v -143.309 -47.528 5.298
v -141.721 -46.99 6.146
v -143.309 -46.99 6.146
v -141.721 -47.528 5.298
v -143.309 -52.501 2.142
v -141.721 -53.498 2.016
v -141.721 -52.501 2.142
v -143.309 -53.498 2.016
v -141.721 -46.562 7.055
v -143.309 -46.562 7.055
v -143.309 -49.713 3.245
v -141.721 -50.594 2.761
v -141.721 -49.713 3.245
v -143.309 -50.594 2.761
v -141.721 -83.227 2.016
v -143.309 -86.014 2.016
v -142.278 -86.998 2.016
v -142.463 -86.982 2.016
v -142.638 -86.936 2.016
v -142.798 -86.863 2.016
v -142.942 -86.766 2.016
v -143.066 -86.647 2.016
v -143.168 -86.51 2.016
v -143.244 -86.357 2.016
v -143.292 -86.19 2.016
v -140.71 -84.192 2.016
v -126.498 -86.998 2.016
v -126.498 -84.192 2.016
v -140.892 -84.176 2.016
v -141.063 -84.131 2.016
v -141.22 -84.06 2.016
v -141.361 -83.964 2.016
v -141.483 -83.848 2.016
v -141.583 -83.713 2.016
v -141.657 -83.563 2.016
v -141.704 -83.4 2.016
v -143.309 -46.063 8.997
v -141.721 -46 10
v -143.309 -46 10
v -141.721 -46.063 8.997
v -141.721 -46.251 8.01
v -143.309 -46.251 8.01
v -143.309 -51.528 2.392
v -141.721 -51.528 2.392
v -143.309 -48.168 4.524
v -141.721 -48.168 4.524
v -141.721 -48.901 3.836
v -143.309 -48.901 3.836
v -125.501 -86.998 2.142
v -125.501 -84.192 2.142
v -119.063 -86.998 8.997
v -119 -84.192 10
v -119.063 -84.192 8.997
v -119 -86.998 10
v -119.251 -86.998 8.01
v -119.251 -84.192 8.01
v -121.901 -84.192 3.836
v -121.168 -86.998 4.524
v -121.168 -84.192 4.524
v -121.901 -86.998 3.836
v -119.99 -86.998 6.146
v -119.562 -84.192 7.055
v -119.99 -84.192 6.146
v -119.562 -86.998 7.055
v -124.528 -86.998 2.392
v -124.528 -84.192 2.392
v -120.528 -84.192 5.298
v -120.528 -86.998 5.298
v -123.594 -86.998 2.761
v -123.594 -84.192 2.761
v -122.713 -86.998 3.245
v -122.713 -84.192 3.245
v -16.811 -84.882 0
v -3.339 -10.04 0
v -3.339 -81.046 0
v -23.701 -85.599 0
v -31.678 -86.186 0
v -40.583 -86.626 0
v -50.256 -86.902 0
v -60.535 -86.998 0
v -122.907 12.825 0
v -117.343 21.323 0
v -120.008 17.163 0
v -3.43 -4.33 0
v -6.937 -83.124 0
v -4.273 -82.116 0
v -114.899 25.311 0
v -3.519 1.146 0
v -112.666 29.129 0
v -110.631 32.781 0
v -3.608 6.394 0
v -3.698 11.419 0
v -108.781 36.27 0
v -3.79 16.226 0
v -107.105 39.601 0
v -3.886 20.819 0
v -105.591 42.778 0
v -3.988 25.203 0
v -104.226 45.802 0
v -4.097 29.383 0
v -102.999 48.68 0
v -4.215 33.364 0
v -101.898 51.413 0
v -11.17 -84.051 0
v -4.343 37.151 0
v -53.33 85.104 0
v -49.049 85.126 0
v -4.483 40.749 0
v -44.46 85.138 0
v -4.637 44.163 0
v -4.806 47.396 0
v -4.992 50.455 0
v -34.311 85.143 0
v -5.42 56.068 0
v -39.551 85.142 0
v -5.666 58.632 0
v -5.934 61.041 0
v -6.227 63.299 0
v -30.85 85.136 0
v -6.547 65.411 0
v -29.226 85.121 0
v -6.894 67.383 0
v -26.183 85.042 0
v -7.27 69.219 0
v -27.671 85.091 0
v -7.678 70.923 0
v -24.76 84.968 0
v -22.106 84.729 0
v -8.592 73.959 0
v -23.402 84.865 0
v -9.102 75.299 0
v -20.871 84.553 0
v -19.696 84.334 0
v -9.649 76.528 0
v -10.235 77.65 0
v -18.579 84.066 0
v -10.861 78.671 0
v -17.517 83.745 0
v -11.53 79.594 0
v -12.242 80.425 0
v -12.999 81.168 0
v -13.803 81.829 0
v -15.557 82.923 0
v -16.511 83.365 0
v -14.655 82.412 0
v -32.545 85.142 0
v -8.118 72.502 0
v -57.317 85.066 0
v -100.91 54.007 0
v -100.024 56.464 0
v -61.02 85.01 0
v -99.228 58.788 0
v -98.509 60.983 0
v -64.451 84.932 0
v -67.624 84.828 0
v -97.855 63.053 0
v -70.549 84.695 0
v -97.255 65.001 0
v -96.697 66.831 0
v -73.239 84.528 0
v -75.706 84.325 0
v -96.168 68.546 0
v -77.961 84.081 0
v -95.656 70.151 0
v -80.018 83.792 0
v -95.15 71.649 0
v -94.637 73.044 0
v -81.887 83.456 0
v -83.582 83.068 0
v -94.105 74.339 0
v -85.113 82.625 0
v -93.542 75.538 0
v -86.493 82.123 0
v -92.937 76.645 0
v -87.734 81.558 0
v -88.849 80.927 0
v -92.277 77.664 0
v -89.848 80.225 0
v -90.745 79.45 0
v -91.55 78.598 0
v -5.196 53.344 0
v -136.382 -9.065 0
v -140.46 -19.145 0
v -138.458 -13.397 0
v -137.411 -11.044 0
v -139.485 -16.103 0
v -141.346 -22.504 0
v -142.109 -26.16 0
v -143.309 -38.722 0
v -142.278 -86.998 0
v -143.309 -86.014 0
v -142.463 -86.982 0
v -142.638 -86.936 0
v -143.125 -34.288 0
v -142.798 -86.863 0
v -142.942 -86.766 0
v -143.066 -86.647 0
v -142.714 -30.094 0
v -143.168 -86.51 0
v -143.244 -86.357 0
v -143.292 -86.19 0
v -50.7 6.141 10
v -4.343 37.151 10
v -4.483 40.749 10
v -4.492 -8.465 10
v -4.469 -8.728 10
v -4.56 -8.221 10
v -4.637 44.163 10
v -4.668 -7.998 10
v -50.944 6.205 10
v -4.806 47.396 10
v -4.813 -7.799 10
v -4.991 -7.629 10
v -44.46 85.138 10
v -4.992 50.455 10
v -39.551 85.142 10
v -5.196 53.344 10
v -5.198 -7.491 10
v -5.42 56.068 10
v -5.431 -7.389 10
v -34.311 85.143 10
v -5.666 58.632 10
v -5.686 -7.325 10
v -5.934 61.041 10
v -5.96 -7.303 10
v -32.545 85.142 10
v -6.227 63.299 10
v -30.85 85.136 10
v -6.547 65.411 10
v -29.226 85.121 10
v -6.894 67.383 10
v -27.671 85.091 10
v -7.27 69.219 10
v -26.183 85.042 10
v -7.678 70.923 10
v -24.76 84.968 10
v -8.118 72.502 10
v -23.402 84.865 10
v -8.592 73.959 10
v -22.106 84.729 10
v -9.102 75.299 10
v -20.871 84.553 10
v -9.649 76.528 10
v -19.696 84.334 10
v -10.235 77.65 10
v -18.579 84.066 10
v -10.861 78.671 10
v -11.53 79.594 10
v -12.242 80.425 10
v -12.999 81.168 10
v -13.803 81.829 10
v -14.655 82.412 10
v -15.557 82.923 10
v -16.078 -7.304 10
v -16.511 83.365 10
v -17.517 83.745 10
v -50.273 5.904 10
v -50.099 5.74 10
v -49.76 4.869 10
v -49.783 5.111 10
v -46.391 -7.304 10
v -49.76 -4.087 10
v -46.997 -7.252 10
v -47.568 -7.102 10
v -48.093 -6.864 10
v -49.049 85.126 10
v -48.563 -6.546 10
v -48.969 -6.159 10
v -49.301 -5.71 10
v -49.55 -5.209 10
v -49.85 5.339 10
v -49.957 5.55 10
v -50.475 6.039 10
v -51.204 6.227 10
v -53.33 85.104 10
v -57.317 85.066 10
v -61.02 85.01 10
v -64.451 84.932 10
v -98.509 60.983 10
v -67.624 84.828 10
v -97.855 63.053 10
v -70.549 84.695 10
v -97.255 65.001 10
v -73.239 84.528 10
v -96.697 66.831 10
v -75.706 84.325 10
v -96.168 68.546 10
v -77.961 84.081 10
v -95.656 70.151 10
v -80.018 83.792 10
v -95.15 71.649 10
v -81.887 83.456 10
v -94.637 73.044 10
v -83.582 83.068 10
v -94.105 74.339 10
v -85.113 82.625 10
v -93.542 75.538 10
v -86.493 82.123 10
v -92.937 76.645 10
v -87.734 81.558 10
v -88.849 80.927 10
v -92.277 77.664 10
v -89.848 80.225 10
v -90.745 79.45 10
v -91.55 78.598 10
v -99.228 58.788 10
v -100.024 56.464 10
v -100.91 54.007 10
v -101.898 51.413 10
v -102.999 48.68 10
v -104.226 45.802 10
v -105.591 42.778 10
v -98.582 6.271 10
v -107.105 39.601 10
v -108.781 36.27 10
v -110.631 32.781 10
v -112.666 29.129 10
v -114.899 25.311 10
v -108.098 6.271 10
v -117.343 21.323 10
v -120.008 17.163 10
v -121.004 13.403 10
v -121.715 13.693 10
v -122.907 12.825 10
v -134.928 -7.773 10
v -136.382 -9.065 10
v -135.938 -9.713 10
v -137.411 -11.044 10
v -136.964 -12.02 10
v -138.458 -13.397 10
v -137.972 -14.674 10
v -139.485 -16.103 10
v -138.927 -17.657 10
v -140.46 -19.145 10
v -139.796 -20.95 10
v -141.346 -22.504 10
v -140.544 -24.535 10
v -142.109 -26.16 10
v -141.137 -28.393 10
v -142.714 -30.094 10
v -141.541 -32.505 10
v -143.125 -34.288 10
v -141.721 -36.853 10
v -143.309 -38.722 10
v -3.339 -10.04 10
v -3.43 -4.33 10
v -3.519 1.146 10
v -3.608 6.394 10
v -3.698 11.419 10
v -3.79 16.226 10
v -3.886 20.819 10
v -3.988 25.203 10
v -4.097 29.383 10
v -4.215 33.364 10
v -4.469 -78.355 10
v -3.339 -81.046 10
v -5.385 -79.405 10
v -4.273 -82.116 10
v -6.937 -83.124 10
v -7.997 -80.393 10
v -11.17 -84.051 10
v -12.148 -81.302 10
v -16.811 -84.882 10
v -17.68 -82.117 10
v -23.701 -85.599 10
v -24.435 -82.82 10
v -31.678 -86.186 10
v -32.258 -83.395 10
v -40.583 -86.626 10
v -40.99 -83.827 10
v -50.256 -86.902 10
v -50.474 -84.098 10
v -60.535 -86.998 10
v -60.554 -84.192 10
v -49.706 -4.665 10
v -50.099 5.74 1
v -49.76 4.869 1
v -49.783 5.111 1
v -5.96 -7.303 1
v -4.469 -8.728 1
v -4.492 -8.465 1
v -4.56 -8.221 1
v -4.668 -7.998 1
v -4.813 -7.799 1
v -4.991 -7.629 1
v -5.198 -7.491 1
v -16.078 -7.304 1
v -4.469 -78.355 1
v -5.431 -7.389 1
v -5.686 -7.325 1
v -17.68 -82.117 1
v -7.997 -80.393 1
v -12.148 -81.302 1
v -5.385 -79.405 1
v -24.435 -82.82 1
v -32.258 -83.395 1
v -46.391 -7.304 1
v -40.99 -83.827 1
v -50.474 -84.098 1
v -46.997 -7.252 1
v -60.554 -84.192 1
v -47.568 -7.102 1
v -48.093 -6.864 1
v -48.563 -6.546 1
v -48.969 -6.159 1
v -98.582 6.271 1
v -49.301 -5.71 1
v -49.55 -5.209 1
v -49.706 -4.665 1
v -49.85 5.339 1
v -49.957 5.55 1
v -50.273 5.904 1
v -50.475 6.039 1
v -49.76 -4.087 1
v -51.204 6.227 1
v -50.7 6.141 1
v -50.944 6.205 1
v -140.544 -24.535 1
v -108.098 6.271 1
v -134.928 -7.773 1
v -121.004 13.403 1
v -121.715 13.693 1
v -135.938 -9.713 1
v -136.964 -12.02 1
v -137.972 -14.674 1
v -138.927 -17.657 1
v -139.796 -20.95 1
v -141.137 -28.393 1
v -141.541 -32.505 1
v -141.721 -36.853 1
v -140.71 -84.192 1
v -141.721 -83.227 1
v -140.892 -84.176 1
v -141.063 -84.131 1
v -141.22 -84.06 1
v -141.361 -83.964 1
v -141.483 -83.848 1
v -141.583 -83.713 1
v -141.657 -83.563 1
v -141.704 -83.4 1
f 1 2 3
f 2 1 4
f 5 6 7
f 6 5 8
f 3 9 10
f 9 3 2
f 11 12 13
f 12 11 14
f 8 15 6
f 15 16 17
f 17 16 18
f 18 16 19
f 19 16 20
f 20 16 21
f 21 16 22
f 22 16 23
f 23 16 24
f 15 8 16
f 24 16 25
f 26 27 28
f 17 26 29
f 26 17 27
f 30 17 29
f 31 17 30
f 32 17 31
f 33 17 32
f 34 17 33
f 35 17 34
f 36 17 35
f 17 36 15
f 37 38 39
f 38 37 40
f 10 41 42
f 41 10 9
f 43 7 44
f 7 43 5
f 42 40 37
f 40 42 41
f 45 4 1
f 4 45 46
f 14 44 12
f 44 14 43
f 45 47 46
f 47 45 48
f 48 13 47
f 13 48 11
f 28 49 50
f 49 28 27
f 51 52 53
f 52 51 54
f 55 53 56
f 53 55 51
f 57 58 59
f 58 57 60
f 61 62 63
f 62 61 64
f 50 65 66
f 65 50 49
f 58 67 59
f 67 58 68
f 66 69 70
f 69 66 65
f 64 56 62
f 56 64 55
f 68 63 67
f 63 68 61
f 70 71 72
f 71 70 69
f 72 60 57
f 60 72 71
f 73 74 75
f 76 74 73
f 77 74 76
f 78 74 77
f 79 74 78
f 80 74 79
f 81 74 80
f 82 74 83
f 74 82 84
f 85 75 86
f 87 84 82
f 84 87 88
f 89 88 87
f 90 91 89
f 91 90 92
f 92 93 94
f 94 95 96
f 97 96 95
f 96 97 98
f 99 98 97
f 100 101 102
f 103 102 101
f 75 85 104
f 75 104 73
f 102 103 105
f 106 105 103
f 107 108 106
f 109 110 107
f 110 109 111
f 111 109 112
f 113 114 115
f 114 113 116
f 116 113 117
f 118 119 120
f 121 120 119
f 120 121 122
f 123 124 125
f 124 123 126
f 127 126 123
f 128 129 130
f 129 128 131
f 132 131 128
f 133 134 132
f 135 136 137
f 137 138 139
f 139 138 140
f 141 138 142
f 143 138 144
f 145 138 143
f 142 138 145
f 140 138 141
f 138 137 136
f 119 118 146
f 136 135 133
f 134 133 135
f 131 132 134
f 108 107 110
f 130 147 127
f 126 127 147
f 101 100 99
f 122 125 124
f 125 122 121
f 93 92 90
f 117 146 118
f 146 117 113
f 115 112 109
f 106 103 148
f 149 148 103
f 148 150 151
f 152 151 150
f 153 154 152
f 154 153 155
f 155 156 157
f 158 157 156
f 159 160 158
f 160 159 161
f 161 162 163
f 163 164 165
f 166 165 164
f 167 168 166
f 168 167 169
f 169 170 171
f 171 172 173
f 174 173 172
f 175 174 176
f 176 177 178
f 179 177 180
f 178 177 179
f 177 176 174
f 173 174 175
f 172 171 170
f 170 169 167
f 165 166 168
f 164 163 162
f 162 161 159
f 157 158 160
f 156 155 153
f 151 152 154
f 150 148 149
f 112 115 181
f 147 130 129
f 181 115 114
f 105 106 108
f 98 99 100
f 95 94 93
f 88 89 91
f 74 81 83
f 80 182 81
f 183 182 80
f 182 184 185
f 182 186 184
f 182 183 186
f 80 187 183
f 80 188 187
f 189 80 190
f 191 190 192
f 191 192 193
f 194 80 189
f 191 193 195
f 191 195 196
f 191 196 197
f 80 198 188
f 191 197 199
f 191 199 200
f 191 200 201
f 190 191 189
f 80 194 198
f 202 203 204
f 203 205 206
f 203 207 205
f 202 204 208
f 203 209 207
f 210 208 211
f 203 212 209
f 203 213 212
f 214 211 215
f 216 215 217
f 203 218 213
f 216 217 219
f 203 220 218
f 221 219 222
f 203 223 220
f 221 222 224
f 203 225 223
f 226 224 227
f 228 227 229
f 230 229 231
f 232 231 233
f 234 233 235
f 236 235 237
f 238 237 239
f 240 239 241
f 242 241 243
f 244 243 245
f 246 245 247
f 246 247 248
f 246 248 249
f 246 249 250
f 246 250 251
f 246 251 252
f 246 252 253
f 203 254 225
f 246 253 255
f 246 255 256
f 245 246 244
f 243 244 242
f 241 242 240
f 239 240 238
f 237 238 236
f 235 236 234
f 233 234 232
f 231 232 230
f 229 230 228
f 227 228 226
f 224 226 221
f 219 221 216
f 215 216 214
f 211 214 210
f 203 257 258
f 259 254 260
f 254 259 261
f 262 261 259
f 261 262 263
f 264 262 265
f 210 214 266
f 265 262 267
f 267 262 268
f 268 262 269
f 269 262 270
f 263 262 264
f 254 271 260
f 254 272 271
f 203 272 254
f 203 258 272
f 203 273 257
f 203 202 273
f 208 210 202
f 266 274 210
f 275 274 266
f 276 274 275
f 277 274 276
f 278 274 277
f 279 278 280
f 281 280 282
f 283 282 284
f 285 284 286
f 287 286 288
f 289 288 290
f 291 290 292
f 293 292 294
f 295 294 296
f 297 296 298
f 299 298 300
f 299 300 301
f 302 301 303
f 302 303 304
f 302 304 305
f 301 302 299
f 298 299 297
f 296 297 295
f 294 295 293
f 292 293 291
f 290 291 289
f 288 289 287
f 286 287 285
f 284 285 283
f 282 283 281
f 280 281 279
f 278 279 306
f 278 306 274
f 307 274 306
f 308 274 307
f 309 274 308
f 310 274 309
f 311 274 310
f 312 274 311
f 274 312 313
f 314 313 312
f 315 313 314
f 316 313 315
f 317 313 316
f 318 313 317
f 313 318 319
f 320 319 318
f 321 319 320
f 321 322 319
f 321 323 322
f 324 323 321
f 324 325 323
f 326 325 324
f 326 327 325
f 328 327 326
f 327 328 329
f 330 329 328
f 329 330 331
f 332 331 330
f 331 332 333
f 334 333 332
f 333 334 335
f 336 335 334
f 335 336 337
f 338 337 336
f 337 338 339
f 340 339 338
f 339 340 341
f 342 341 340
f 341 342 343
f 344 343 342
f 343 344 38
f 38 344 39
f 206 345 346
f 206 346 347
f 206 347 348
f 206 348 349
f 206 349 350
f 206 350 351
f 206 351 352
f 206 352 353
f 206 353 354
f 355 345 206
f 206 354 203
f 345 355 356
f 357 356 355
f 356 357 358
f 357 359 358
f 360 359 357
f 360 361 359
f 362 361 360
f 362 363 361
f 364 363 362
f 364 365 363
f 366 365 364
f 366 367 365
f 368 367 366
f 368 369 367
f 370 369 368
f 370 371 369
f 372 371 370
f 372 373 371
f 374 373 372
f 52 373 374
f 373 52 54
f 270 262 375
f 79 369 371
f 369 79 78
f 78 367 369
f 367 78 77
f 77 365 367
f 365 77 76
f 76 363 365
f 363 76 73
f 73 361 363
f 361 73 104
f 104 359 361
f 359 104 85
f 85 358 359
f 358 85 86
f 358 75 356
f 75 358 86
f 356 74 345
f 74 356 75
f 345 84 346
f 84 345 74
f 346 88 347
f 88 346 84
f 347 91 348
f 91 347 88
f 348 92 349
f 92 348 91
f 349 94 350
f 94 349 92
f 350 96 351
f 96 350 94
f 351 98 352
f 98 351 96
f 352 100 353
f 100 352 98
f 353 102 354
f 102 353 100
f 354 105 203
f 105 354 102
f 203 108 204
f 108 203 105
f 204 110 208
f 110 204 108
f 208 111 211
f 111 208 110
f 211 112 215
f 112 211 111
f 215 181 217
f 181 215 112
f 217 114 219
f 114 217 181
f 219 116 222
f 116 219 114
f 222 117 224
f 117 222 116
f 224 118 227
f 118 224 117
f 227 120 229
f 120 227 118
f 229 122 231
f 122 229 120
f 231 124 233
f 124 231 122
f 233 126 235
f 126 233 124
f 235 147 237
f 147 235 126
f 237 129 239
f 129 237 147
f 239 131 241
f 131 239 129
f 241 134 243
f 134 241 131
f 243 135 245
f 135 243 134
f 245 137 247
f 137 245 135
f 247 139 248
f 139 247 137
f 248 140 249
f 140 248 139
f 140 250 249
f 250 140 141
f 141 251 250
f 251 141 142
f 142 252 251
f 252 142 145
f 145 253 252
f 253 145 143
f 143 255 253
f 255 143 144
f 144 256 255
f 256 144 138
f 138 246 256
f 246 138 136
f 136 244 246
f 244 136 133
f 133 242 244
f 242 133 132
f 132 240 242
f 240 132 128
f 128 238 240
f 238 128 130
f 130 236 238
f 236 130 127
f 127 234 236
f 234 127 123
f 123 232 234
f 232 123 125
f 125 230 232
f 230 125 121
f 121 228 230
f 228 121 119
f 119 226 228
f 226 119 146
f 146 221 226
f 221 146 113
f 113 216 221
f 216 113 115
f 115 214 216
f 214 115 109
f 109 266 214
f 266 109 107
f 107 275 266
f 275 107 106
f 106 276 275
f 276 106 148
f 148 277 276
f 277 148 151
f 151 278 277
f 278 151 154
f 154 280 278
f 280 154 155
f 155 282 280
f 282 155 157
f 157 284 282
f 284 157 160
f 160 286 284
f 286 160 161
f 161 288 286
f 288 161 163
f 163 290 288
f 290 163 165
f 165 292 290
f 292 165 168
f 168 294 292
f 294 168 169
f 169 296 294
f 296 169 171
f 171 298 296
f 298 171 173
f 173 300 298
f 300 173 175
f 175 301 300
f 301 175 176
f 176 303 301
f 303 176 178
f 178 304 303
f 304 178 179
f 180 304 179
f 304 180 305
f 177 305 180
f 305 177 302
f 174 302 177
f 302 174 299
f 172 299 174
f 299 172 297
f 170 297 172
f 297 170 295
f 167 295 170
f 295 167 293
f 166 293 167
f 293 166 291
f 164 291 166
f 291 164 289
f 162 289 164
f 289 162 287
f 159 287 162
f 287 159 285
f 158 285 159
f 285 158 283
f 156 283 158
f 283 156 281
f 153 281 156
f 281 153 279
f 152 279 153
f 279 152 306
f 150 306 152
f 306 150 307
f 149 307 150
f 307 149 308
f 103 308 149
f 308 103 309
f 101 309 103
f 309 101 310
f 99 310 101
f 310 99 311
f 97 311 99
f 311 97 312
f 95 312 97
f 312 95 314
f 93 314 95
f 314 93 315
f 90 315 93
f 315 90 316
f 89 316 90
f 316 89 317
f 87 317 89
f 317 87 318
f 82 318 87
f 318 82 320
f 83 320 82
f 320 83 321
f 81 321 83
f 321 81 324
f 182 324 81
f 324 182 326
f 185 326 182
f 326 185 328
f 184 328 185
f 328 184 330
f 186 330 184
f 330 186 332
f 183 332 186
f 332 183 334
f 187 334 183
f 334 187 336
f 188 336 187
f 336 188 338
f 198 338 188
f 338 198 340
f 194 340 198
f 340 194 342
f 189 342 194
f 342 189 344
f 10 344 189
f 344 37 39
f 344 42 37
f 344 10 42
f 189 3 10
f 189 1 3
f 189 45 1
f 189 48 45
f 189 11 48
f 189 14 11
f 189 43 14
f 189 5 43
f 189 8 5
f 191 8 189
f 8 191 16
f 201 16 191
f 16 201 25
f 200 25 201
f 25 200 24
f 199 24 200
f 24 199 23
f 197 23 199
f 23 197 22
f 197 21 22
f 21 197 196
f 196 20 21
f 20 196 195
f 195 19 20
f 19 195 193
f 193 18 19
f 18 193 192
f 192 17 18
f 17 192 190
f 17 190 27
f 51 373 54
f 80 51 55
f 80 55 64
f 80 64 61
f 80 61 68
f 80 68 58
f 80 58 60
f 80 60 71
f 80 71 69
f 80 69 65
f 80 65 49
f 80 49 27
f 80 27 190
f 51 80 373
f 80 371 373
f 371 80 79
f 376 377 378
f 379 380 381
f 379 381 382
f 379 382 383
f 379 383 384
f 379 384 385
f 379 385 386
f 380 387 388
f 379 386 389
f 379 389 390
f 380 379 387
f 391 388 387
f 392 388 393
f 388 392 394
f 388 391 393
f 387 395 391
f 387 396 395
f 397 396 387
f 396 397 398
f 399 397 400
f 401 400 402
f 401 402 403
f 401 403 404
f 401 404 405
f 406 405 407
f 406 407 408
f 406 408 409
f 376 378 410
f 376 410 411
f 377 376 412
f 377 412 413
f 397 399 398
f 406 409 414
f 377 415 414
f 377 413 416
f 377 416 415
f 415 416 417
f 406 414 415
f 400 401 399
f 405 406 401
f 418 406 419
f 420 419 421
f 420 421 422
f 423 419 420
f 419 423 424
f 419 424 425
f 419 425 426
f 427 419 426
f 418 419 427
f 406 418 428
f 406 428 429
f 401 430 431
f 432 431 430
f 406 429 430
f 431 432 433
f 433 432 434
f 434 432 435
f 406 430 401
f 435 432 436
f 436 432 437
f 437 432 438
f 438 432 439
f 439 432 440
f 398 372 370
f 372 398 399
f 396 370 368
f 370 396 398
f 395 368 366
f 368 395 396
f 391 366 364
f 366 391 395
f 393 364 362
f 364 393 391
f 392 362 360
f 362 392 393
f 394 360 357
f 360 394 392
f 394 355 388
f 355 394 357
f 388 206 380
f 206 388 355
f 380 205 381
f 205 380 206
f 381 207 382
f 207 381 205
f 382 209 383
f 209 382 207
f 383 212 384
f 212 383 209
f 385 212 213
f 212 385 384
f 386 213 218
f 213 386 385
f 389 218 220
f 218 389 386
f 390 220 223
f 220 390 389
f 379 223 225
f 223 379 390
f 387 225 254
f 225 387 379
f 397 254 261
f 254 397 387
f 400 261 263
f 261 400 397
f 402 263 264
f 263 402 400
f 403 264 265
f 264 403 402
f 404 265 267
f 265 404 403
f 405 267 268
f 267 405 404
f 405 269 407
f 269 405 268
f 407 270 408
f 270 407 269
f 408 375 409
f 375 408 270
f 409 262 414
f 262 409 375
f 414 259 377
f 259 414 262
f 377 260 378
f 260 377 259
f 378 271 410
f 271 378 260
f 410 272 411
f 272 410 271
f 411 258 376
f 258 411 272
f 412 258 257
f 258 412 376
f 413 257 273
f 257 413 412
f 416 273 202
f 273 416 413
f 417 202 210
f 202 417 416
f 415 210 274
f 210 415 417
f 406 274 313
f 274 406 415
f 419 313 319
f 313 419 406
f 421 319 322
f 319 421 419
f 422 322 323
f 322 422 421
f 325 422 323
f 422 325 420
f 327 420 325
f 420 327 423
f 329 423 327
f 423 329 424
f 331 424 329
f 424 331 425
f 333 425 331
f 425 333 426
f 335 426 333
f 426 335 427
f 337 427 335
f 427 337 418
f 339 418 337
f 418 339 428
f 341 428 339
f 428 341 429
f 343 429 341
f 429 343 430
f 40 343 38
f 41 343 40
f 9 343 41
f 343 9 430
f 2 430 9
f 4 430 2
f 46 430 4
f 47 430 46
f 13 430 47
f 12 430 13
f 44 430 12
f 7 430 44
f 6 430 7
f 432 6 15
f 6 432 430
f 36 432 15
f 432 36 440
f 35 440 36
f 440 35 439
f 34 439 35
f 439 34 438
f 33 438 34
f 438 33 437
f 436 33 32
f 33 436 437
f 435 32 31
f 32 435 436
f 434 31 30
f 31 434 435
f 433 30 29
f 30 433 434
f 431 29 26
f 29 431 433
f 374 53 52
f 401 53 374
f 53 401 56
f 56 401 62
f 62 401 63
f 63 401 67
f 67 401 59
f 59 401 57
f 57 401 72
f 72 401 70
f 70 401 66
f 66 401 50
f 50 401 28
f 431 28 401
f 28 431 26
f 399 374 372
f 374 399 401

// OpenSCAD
// file: ../bezier.scad
function mix(p1, p2, t) = [p1[0] * (1 - t) + p2[0] * t, p1[1] * (1 - t) + p2[1] * t];

function bezier_point(p, t) =
    let (
        a = mix(p[0], p[1], t),
        b = mix(p[1], p[2], t),
        c = mix(p[2], p[3], t),
        d = mix(a, b, t),
        e = mix(b, c, t)
    )
    mix(d, e, t);

function bezier_points(p, N) = [
    for (i = [0 : N - 1]) bezier_point(p, i / (N - 1))
];
// file: ../profiles.scad
include <array_ops.scad>
include <bezier.scad>

n_corner_points = 10;

board_profile_points = concat(
    [[-119.504642, 22.529083], [-106.09824, 14.768994],
        [-106.09824, 14.768994], [-96.213288, 14.768994],
        [-96.213288, 14.768994], [-46.99839, 14.721548]],
bezier_points(
    [[-46.99839, 14.721548], [-46.16894, 14.721172], [-45.497997, 14.049582], [-
45.498384, 13.243936]], n_corner_points),
    [[-45.498384, 13.243936], [-45.498384, 3.499618]],
bezier_points(
    [[-45.498384, 3.499618], [-45.499493, 1.567921], [-43.9343, 0.00093], [-41.998735, -
0.000898]],
n_corner_points),
    [[-41.998735, -0.000898], [-10.510735, -0.000898],
        [-10.510735, -0.000898], [0, 0]],
bezier_points(
    [[0, 0], [0.876629, 0.003368], [1.548207, -0.667575], [1.548595, -1.550011]],
n_corner_points),
    [[1.548595, -1.550011], [1.548595, -77.305898]],
bezier_points(
    [[1.548595, -77.305898], [1.498595, -80.815755], [-24.536412, -83.655898], [-
56.710735, -83.655898]], n_corner_points),
    [[-56.710735, -83.655898], [-114.910735, -83.655898],
        [-114.910735, -83.655898], [-139.974397, -83.655898]],
bezier_points(
    [[-139.974397, -83.655898], [-140.553969, -83.655567], [-141.023536, -83.185462], [-
141.023875, -82.60589]], n_corner_points),
    [[-141.023875, -82.60589], [-141.023875, -32.15045]],
bezier_points(
    [[-141.023875, -32.15045], [-140.847733, -17.594028], [-137.053996, -6.226473], [-
133.968073, -0.510408]], n_corner_points),
    [[-133.968073, -0.510408], [-120.242566, 22.844102]]
);

wrist_support_top_points = concat(
    [[-119.504642, 22.529083], [-106.09824, 14.768994],
        [-106.09824, 14.768994], [-96.213288, 14.768994],
        [-96.213288, 14.768994], [-46.99839, 14.721548]],
bezier_points(
    [[-46.99839, 14.721548], [-46.16894, 14.721172], [-45.497997, 14.049582], [-
45.498384, 13.243936]], n_corner_points),
    [[-45.498384, 13.243936], [-45.498384, 3.499618]],
bezier_points(
    [[-45.498384, 3.499618], [-45.499493, 1.567921], [-43.9343, 0.00093], [-41.998735, -
0.000898]],
n_corner_points),
    [[-41.998735, -0.000898], [-10.510735, -0.000898],
        [-10.510735, -0.000898], [0, 0]],
bezier_points(
    [[0, 0], [0.876629, 0.003368], [1.548207, -0.667575], [1.548595, -1.550011]],
n_corner_points
)
);

board_top_points = concat(
    [[1.548595, -1.550011], [1.548595, -77.305898]],
bezier_points(
    [[1.548595, -77.305898], [1.498595, -80.815755], [-24.536412, -83.655898], [-
56.710735, -83.655898]], n_corner_points),
    [[-56.710735, -83.655898], [-114.910735, -83.655898],
        [-114.910735, -83.655898], [-139.974397, -83.655898]],
bezier_points(
    [[-139.974397, -83.655898], [-140.553969, -83.655567], [-141.023536, -83.185462], [-
141.023875, -82.60589]], n_corner_points),
    [[-141.023875, -82.60589], [-141.023875, -32.15045]],
bezier_points(
    [[-141.023875, -32.15045], [-140.847733, -17.594028], [-137.053996, -6.226473], [-
133.968073, -0.510408]], n_corner_points),
    [[-133.968073, -0.510408], [-120.242566, 22.844102]]
);

wrist_support_bottom_points = concat(
bezier_points(
    [
        [-120.242566, 22.844102],
        [-70, 100],
        [-120, 100],
        [-30, 100]
    ], n_corner_points * 5),
bezier_points(
    [
        [-30, 100],
        [0, 100],
        [0, 100],
        [1.548595, -1.550011]
    ], n_corner_points * 5)
);

case_profile_points = concat(
board_top_points,
wrist_support_bottom_points
);
// file: ../array_ops.scad
function reverse(arr) = [
    for (i = [1:len(arr)]) arr[len(arr) - i]
    ];

function translate2d(arr, tr) = [
    for (point = arr) [point[0] + tr[0], point[1] + tr[1]]
    ];

function scale2d(arr, factor, centerpoint) = [
    for (point = arr) [
                (point[0] - centerpoint[0]) * factor + centerpoint[0],
                (point[1] - centerpoint[1]) * factor + centerpoint[1],
        ]
    ];

function scale2d_multi(arr, factors, centerpoint) = [
    for (point = arr) [
                (point[0] - centerpoint[0]) * factors[0] + centerpoint[0],
                (point[1] - centerpoint[1]) * factors[1] + centerpoint[1],
        ]
    ];

function sum(v) = [for (p = v) 1] * v;

function get_center_point(points) =
    [
        sum([for (p = points) p[0]]) / len(points),
        sum([for (p = points) p[1]]) / len(points),
    ];
// file: ../choc_profiles.scad
include <config.scad>
include <profiles.scad>

min_x = min([for (p = case_profile_points) p[0]]);
min_y = min([for (p = case_profile_points) p[1]]);

choc_board_profile_points = scale2d_multi(
board_profile_points, choc_scale, [min_x, min_y]
);

choc_case_points = scale2d_multi(
case_profile_points, choc_scale, [min_x, min_y]
);

choc_wrist_support_top_points = scale2d_multi(
wrist_support_top_points, choc_scale, [min_x, min_y]
);

choc_wrist_support_bottom_points = scale2d_multi(
wrist_support_bottom_points, choc_scale, [min_x, min_y]
);
// file: ../config.scad
rotation = [10, 10, 170];
translation = [-160, 0, 25];
choc_scale = [0.95315, 0.91];
// file: ../stand.scad
include <profiles.scad>

module base_volume(profile_points, outer_scale_margin, rotation, translation) {
    center_point = get_center_point(profile_points);
    linear_extrude(height = 120)
        projection(cut = false)
            translate(translation)
                rotate(rotation)
                    linear_extrude(height = 0.1)
                        translate([center_point[0], center_point[1], 0])
                            scale([1 + outer_scale_margin, 1 + outer_scale_margin, 1])
                                translate([-center_point[0], -center_point[1], 0])
                                    polygon(profile_points);
};


module keyboard_base(profile_points, outer_scale_margin, rotation, translation) {
    difference() {
        base_volume(
        profile_points = profile_points,
        outer_scale_margin = outer_scale_margin + 0.02,
        rotation = rotation,
        translation = translation
        );
        translate([0, 0, -0.1])
            base_volume(
            profile_points = profile_points,
            outer_scale_margin = outer_scale_margin - 0.03,
            rotation = rotation,
            translation = translation
            );

        translate(translation)
            rotate(rotation)
                translate([-500, -500, 5])
                    cube([1000, 1000, 1000]);

        translate(translation)
            rotate(rotation)
                keyboard_body(profile_points, 100, outer_scale_margin);

        translate(translation)
            rotate(rotation)
                case_holes(rad_extra = 0.1);
    };
};
// file: ../housing.scad
include <array_ops.scad>
include <profiles.scad>

$fn = 50;
outer_scale_margin = 0.03;

module board_with_thickenss(points) {
    linear_extrude(height = 2)
        polygon(points);
};

module keyboard_space(
profile_points,
bottom_thickenss,
case_height,
scale_margin,
eps = 0.01
) {
    center_point = get_center_point(profile_points);
    translate([0, 0, bottom_thickenss])
        linear_extrude(height = case_height - bottom_thickenss + eps)
            translate([center_point[0], center_point[1], 0])
                scale([1 + scale_margin, 1 + scale_margin, 1])
                    translate([-center_point[0], -center_point[1], 0])
                        polygon(profile_points);
};

module keyboard_body(profile_points, case_height, scale_margin) {
    center_point = get_center_point(profile_points);
    linear_extrude(height = case_height)
        translate([center_point[0], center_point[1], 0])
            scale([1 + scale_margin, 1 + scale_margin, 1])
                translate([-center_point[0], -center_point[1], 0])
                    polygon(profile_points);
};

function scale_wrist_support_points(
top_points, bottom_points, outer_scale, board_scale, case_center, board_center
) = concat(
scale2d(bottom_points, outer_scale, case_center),
scale2d(top_points, board_scale, board_center)
);

module case_hole(hole_height, hole_rad, hull_length) {
    linear_extrude(hole_height)
        hull() {
            translate([hull_length, 0, 0])
                circle(r = hole_rad);
            circle(r = hole_rad);
        };
};

module case_holes(rad_extra = 0) {
    hole_height = 10;
    hole_rad = 8 + rad_extra;
    hull_length = 18;
    translate([-148, -90, 10])
        rotate([90, 00, 90])
            case_hole(
            hole_height = hole_height,
            hole_rad = hole_rad,
            hull_length = hull_length * 2
            );
    translate([-145, -80, 10])
        rotate([90, 00, 0])
            case_hole(
            hole_height = hole_height,
            hole_rad = hole_rad,
            hull_length = hull_length
            );
};

module case(board_points, case_points) {
    case_height = 10;
    keyboard_hole_scale_margin = 0.01;
    bottom_thickenss = 1;
    * case_holes();
    difference() {
        keyboard_body(
        profile_points = case_points,
        case_height = case_height,
        scale_margin = outer_scale_margin
        );
        keyboard_space(
        profile_points = board_points,
        bottom_thickenss = bottom_thickenss,
        case_height = case_height,
        scale_margin = keyboard_hole_scale_margin
        );
        case_holes();
    };
};

module wrist_support(
top_points, bottom_points, outer_scale, board_scale, case_center, board_center
) {
    height = 1;
    board_height = 10;
    inset = 0.99;

    wrist_support_points_outer = scale_wrist_support_points(
    top_points,
    bottom_points,
    outer_scale,
    board_scale,
    case_center,
    board_center
    );
    translate([0, 0, board_height])
        linear_extrude(height)
            polygon(wrist_support_points_outer);
};
// main file
include <../housing.scad>
include <../stand.scad>
include <../config.scad>
include <../choc_profiles.scad>

case(
board_points = choc_board_profile_points,
case_points = choc_case_points
);
